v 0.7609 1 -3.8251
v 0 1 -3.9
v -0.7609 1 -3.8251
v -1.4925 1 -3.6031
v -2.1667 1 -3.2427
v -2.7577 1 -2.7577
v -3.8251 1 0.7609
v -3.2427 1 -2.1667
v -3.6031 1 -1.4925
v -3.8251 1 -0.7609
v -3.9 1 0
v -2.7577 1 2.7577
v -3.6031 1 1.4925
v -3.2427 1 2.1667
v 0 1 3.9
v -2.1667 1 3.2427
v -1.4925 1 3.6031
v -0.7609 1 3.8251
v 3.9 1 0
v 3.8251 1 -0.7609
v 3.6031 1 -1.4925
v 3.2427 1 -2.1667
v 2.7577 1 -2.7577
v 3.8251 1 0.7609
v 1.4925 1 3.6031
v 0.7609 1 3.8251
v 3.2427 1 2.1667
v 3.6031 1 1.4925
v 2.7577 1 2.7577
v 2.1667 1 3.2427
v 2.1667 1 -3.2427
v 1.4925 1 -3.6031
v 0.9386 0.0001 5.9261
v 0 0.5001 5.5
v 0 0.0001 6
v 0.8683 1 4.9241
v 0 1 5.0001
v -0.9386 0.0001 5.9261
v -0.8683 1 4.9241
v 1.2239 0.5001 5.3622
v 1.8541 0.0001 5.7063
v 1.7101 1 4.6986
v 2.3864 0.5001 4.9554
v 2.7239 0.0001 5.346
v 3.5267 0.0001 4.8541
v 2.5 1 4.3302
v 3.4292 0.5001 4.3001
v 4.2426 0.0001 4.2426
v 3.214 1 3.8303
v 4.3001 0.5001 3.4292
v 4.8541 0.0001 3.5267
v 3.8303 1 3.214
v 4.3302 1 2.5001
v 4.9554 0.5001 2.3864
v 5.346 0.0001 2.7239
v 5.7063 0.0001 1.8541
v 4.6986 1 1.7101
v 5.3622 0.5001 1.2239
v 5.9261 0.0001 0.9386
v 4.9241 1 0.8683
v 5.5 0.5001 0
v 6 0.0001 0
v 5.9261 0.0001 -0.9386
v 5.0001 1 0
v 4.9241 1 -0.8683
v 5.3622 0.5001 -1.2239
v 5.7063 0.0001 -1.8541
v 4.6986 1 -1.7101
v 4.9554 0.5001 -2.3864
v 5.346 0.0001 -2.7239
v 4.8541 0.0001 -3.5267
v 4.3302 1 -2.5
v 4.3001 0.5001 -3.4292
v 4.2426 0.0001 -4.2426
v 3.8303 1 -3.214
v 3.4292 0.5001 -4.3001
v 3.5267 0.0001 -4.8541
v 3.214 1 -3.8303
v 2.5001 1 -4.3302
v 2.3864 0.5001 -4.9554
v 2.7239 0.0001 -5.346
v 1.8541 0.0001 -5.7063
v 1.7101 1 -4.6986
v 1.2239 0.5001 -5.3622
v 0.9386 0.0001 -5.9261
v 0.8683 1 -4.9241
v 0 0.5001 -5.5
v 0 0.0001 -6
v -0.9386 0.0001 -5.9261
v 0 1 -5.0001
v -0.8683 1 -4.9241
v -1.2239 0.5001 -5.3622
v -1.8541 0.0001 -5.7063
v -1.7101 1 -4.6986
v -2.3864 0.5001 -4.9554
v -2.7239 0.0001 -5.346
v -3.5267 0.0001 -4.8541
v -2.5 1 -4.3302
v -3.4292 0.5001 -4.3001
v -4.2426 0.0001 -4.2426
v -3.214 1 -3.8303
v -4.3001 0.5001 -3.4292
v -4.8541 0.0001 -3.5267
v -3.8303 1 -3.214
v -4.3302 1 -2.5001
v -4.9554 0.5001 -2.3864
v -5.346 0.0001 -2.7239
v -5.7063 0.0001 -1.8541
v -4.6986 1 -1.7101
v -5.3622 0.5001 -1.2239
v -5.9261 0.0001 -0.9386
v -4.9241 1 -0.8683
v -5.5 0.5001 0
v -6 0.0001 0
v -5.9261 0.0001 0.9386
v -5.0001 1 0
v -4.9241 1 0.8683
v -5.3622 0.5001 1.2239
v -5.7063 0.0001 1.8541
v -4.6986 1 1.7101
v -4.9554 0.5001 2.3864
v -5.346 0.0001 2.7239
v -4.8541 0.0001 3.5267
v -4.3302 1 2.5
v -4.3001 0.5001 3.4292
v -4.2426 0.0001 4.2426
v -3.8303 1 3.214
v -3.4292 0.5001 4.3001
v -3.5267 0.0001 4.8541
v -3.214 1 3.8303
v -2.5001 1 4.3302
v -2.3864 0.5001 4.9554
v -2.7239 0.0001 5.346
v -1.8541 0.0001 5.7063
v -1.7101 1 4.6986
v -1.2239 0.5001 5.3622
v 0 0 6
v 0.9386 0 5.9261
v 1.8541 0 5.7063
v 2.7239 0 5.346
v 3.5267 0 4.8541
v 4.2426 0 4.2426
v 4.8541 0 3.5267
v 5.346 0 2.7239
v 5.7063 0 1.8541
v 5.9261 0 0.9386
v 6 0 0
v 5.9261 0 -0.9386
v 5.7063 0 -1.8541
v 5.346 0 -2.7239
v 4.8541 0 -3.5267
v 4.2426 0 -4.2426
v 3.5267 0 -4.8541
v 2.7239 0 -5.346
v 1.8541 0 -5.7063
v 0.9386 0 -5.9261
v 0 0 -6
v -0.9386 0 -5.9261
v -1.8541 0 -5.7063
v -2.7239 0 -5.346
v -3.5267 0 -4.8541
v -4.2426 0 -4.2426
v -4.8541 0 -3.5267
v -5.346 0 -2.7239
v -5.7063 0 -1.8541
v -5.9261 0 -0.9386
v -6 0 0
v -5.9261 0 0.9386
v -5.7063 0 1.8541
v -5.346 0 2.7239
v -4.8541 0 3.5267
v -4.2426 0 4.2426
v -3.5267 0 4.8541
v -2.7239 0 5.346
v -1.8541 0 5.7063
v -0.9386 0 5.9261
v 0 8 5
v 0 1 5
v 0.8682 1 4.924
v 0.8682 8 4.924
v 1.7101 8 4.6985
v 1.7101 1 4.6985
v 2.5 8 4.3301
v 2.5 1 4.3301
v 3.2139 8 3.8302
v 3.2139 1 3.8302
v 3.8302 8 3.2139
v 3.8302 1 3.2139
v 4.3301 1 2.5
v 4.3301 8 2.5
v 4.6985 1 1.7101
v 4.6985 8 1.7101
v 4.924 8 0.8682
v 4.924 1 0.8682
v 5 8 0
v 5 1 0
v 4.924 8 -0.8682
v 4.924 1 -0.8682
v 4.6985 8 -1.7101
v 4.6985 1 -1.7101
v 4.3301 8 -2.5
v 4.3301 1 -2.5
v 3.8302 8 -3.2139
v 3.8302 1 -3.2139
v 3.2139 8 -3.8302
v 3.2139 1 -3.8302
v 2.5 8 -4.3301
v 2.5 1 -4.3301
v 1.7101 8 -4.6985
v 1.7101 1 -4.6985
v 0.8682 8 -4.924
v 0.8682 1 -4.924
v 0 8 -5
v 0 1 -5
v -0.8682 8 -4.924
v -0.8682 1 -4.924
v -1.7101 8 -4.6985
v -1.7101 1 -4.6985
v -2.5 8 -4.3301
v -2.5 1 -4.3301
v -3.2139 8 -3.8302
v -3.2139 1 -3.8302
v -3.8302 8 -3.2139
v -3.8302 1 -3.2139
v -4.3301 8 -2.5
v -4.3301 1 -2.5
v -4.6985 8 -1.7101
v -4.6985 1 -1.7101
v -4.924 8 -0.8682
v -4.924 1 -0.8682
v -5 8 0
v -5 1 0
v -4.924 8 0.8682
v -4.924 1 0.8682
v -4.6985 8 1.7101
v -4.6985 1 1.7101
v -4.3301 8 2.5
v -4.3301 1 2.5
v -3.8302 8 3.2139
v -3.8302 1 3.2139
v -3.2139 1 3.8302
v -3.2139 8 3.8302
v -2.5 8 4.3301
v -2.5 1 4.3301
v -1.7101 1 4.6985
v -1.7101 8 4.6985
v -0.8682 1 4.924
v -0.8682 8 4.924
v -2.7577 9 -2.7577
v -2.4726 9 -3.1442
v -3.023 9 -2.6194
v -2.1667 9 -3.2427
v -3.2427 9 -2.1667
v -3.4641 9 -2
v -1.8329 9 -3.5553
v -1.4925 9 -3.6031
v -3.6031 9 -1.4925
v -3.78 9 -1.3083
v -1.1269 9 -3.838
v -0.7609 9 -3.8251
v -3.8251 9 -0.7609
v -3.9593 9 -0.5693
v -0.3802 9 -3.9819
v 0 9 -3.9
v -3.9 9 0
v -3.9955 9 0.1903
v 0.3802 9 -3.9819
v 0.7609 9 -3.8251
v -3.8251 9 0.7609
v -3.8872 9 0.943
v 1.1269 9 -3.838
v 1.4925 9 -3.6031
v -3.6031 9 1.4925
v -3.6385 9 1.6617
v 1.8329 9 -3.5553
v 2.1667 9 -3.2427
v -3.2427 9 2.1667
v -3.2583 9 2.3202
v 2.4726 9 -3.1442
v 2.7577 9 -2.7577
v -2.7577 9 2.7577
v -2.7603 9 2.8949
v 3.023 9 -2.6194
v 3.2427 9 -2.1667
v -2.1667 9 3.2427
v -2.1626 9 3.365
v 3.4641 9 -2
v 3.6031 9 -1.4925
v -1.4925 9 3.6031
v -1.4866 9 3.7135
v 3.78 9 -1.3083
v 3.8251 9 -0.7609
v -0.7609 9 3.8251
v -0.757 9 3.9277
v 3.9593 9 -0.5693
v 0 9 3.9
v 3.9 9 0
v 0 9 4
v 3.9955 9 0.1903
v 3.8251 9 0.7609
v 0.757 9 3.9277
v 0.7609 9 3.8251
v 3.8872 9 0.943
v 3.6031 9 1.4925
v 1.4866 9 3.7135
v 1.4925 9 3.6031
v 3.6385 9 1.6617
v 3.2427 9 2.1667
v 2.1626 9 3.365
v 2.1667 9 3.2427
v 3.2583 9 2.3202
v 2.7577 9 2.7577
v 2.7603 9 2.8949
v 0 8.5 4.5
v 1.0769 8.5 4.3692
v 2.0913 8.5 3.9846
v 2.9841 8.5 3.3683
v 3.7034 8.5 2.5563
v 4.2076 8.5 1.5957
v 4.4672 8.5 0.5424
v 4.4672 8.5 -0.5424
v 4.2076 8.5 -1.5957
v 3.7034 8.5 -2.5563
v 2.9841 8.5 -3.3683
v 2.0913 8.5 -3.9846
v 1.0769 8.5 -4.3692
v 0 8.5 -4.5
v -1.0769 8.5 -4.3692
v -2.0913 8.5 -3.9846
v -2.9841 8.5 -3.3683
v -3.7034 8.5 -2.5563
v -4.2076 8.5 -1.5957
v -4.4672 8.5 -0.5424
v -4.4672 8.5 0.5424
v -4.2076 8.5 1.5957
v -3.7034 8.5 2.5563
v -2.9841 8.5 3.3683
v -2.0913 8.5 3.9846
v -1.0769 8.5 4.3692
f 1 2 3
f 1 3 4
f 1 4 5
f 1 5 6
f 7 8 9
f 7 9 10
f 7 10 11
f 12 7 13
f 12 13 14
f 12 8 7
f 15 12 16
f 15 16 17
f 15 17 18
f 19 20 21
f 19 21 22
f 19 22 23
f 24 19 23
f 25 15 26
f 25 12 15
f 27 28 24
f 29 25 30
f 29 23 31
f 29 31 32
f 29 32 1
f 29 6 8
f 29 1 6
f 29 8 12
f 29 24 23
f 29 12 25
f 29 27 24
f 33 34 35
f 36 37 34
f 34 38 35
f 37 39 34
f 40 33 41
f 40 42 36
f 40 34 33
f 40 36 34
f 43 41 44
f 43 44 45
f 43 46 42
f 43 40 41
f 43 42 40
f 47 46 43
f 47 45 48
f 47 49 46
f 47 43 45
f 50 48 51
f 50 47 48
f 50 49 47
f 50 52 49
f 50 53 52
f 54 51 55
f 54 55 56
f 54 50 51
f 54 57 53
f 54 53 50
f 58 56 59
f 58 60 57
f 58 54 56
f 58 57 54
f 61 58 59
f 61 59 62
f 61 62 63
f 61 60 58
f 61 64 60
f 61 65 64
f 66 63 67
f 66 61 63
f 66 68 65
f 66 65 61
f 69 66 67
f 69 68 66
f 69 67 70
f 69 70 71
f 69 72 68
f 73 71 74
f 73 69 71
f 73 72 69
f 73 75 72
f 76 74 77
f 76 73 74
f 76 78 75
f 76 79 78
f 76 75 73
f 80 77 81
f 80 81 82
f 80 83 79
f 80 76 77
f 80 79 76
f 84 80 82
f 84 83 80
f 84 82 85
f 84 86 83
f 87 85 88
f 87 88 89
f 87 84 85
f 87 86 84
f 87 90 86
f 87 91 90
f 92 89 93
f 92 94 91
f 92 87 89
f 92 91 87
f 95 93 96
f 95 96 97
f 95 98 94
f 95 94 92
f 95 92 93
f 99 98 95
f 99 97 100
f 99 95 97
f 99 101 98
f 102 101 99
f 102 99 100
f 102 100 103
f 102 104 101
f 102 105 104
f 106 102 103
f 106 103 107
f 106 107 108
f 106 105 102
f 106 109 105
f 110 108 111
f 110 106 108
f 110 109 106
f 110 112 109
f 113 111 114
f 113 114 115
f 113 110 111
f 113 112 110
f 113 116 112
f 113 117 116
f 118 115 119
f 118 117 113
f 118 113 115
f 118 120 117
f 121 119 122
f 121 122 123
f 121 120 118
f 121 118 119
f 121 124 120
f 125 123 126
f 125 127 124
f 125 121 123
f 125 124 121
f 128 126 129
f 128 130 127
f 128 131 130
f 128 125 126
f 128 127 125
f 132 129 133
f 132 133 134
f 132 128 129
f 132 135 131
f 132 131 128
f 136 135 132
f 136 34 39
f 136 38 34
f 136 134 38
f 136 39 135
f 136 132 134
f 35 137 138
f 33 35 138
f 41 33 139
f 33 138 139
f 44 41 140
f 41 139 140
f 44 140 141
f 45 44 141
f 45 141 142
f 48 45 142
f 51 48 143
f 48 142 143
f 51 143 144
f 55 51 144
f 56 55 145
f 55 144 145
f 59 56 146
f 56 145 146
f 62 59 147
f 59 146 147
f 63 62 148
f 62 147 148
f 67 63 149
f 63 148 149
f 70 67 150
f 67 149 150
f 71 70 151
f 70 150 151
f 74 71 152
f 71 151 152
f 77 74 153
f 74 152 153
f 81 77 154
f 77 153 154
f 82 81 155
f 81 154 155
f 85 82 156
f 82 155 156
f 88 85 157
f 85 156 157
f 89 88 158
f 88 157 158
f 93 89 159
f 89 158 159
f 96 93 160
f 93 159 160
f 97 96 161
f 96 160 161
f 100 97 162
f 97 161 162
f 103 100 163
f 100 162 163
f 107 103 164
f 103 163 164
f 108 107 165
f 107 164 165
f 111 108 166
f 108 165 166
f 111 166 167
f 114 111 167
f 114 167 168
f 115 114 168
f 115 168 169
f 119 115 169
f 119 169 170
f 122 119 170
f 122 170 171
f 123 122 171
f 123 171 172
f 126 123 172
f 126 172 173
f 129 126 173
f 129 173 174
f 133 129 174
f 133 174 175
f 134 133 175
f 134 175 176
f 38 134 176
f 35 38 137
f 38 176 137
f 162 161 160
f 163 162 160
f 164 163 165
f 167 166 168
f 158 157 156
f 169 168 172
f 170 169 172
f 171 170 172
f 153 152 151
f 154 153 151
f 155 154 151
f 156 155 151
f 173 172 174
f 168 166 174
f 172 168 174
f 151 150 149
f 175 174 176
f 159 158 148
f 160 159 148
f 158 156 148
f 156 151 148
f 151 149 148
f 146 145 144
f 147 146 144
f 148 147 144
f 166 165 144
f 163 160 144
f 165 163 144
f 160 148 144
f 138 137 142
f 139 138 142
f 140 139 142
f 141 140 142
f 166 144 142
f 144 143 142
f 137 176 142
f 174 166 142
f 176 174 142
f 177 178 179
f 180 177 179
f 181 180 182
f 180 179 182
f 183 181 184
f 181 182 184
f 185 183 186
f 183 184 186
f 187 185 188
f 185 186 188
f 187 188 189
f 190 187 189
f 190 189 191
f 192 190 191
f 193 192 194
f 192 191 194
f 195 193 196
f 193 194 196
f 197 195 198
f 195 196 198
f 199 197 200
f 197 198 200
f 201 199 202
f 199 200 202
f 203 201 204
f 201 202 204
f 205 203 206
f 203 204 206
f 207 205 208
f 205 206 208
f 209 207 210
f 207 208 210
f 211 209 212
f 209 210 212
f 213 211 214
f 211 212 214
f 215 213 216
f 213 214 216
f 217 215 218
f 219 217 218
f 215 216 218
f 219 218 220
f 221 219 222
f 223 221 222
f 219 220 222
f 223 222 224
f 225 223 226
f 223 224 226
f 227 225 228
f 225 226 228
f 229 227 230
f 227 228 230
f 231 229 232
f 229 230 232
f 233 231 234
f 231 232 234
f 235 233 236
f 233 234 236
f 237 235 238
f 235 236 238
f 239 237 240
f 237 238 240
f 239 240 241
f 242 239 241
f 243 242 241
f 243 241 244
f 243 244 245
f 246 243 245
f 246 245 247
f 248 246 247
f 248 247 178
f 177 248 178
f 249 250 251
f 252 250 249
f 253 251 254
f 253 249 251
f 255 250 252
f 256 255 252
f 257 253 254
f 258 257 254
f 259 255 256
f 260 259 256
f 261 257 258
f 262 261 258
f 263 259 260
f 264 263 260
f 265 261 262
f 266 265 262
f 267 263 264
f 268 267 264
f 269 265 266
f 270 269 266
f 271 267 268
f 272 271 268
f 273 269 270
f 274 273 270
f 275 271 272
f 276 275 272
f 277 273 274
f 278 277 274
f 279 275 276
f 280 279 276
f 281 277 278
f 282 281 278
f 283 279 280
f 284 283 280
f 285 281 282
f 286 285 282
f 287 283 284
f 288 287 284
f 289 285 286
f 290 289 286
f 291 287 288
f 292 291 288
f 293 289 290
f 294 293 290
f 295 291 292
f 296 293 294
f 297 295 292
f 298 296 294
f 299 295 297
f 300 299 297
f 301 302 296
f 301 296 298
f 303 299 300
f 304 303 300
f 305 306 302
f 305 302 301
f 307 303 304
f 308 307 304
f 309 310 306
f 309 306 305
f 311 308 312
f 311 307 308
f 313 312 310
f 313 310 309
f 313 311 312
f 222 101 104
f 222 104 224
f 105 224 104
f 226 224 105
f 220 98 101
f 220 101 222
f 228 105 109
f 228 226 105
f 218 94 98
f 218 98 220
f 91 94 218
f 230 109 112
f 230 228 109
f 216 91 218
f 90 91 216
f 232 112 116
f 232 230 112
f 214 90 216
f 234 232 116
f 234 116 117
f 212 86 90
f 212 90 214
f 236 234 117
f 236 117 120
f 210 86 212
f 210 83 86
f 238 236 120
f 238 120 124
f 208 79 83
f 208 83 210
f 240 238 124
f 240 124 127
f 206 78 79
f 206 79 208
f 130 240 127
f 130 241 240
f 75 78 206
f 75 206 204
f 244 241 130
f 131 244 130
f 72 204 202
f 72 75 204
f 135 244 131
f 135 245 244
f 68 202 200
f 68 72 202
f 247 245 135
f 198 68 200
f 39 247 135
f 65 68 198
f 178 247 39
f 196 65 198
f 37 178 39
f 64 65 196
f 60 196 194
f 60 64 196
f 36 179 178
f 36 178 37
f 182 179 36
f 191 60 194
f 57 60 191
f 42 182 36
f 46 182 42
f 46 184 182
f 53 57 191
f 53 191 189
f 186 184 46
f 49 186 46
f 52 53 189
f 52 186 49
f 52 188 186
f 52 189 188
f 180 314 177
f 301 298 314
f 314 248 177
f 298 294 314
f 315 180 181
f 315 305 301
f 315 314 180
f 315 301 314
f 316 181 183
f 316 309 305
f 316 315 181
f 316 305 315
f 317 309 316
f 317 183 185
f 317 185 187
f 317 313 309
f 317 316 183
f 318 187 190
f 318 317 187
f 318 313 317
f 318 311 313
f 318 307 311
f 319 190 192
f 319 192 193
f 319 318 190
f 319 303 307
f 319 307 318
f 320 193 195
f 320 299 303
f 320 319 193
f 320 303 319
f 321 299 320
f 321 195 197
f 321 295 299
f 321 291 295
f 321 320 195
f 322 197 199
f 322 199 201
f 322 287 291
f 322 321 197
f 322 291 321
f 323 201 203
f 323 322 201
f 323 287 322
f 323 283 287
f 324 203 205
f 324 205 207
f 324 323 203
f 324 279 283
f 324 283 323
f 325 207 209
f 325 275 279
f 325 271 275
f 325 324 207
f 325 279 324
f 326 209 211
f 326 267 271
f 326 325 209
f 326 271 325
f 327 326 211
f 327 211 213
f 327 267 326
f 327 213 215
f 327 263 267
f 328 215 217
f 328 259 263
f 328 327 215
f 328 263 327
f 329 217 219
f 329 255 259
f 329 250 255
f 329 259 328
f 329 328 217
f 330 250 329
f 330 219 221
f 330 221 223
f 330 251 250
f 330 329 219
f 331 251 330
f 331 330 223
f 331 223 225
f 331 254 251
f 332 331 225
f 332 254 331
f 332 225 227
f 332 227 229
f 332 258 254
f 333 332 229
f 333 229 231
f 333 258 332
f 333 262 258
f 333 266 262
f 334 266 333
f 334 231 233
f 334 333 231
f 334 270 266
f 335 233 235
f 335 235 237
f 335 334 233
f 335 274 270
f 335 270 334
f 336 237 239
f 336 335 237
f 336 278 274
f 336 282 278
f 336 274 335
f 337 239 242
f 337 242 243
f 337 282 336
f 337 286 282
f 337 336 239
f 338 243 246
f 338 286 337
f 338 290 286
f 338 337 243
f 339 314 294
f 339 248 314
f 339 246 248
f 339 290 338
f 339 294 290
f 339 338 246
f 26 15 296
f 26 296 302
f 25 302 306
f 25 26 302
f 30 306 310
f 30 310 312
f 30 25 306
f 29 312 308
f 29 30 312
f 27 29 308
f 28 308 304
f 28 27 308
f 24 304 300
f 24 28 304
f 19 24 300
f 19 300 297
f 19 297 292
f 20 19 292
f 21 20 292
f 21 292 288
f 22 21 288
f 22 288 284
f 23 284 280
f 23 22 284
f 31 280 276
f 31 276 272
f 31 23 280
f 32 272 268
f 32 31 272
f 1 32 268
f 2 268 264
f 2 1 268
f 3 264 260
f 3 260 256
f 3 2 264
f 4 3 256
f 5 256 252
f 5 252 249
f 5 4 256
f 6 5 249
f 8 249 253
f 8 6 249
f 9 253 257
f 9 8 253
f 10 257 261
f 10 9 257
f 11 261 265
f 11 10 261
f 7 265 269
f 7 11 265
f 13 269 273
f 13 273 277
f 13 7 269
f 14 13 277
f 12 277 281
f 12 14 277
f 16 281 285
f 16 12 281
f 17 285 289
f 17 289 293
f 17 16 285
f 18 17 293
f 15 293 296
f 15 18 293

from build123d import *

# Parameters (mm, degrees)
SKETCH_1_R      = 6
EXTRUDE_1_DEPTH = 1
SKETCH_2_R      = 5
SKETCH_2_R_2    = 3.9
EXTRUDE_2_DEPTH = 8
CHAMFER_1_SIZE  = 1
CHAMFER_2_SIZE  = 1


with BuildPart() as part:
    # Эскиз1 → Бобышка-Вытянуть1 (new body)
    with BuildSketch(Plane(origin=(0, 0, 0), x_dir=(1, 0, 0), z_dir=(0, 1, 0))):
        with Locations(Location((0, 0, 0), (0, 0, 270))):
            Circle(SKETCH_1_R)
    extrude(amount=EXTRUDE_1_DEPTH)

    # Эскиз2 → Бобышка-Вытянуть2 (add)
    with BuildSketch(Plane(origin=(0, 1, 0), x_dir=(1, 0, 0), z_dir=(0, 1, 0))):
        with Locations(Location((0, 0, 0), (0, 0, 270))):
            Circle(SKETCH_2_R)
        with Locations(Location((0, 0, 0), (0, 0, 270))):
            Circle(SKETCH_2_R_2, mode=Mode.SUBTRACT)
    extrude(amount=EXTRUDE_2_DEPTH)

    # Фаска1
    chamfer_1_edges = [part.edges().sort_by_distance(p)[0] for p in [
        (0, 1, -6),
    ]]
    chamfer(chamfer_1_edges, length=CHAMFER_1_SIZE - 0.0001)  # a hair under: the kernel refuses the full size

    # Фаска2
    chamfer_2_edges = [part.edges().sort_by_distance(p)[0] for p in [
        (0, 9, -5),
    ]]
    chamfer(chamfer_2_edges, length=CHAMFER_2_SIZE)


solid = part.part
